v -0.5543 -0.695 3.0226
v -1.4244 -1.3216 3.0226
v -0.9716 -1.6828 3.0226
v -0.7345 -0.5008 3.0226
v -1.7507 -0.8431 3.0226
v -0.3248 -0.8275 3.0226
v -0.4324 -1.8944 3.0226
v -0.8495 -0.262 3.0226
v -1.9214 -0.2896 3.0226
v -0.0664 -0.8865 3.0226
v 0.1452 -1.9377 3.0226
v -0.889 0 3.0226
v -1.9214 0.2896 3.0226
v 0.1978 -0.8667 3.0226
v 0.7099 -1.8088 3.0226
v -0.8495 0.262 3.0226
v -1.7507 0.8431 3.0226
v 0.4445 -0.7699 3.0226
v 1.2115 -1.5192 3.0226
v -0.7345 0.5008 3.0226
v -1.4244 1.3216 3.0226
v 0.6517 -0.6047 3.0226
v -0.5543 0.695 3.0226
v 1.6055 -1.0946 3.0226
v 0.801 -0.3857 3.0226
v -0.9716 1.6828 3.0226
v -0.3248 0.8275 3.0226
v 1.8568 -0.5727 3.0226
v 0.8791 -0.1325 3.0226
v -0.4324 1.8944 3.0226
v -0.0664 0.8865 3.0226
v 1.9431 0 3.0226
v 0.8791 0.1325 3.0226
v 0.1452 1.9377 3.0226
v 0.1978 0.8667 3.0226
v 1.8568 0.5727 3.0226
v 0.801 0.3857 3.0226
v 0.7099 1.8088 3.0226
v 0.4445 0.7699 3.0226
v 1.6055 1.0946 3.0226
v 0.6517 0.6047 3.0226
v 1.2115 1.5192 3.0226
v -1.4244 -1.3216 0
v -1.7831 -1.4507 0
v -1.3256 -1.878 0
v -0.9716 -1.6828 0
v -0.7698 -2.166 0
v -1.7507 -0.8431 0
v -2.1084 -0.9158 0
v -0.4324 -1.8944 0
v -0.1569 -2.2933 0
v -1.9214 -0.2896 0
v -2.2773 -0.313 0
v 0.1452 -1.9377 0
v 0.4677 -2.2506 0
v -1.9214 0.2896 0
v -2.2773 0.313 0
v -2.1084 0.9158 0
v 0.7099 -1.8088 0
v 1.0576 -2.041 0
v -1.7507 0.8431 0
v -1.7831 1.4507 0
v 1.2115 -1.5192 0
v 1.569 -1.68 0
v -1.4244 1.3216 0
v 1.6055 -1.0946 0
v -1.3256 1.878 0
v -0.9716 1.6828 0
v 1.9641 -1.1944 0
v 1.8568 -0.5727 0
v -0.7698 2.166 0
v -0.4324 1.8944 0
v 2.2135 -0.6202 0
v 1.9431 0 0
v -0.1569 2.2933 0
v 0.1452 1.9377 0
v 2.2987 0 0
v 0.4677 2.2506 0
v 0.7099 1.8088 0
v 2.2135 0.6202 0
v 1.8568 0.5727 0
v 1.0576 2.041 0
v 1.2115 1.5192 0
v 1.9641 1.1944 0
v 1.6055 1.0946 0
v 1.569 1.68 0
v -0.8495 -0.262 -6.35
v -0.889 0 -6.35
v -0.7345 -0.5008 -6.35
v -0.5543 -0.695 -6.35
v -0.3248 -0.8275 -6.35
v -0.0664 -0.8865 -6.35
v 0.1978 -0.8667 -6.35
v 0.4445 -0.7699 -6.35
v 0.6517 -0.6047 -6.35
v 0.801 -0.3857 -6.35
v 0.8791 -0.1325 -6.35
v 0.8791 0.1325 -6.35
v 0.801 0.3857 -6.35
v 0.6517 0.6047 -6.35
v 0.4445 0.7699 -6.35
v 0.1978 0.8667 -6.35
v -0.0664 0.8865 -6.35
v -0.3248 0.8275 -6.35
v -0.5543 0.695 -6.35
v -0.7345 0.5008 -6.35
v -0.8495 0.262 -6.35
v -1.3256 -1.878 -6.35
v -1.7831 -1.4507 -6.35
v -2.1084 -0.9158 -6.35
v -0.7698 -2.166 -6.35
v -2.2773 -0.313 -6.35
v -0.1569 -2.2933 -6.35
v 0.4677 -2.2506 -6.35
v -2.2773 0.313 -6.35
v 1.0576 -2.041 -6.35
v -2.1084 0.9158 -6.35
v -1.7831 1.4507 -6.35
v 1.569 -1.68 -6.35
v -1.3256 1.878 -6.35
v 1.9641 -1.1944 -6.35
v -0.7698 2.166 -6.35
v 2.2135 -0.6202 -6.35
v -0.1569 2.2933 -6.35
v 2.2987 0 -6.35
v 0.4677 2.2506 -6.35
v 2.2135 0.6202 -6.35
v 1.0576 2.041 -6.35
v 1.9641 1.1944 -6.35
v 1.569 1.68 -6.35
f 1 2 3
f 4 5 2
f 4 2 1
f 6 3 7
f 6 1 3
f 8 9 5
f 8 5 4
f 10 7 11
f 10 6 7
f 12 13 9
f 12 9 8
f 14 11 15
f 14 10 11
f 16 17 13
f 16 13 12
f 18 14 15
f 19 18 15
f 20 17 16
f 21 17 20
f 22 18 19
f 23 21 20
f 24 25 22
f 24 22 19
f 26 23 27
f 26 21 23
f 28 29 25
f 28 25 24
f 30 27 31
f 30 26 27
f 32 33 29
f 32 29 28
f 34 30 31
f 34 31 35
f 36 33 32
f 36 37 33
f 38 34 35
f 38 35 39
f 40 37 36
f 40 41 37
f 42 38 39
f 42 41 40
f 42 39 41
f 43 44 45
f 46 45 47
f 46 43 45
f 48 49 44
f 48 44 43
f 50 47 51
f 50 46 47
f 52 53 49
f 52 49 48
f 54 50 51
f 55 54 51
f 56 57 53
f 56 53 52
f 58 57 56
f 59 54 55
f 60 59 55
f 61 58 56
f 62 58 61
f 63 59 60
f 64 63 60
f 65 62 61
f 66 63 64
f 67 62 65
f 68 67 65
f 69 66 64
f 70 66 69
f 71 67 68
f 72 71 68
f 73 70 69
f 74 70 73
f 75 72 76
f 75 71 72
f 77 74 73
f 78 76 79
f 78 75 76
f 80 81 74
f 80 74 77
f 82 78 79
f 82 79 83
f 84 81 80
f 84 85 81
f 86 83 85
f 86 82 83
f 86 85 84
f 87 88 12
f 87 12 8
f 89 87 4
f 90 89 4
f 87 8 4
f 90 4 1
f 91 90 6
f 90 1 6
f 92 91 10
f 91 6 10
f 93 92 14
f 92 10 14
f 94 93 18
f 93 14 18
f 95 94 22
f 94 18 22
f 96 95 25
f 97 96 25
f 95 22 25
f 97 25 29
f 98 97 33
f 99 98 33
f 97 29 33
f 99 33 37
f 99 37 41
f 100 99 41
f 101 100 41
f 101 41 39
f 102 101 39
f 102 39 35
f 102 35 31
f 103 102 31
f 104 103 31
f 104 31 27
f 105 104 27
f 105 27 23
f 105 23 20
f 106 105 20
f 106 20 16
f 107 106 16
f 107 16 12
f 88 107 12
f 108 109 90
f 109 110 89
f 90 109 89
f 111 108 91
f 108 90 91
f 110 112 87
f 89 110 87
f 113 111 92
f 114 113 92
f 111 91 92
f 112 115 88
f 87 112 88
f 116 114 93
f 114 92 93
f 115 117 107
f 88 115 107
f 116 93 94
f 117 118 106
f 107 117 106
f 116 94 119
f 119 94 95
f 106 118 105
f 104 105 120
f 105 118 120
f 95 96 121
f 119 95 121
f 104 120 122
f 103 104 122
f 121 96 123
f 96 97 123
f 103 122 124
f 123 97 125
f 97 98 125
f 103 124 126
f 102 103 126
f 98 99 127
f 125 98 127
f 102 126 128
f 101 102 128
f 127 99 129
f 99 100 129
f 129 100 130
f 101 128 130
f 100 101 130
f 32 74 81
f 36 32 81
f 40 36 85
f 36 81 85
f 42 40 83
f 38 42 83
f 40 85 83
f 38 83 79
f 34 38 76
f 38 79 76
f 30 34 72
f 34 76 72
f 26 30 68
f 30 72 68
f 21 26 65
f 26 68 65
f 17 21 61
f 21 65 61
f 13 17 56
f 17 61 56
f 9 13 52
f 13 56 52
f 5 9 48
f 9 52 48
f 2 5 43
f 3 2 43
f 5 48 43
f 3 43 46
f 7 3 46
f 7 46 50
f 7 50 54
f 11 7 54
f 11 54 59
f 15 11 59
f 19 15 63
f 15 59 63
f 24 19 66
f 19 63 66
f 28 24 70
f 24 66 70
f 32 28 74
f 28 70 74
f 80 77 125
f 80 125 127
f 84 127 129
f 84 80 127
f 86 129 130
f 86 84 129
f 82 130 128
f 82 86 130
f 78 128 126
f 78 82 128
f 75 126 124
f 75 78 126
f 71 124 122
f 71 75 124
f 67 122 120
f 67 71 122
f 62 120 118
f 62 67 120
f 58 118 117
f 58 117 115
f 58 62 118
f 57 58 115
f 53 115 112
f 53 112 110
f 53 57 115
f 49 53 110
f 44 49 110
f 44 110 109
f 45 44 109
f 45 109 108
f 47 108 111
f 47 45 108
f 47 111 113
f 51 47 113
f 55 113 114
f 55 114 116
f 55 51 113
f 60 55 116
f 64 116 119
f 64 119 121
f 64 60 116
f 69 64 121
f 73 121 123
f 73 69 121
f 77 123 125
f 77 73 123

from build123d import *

# Parameters (mm, degrees)
F1_R     = 1.9431
F2_DEPTH = 3.0226
F1_R_2   = 2.2987
F3_DEPTH = 6.35
F5_D     = 1.778


with BuildPart() as f2:
    # F1 (on Top) → F2 (new body)
    with BuildSketch(Plane.XY):
        Circle(F1_R)
    extrude(amount=F2_DEPTH)

    # F1 (on Top) → F3 (join)
    with BuildSketch(Plane.XY):
        Circle(F1_R_2)
        Circle(F1_R, mode=Mode.SUBTRACT)
        Circle(F1_R)
    extrude(amount=-F3_DEPTH)

    # F5 (through all)
    with Locations(Plane(origin=(0, 0, -6.35), x_dir=(1, 0, 0), z_dir=(0, 0, -1))):
        with Locations((0, 0)):
            Hole(F5_D / 2)


solid = f2.part
